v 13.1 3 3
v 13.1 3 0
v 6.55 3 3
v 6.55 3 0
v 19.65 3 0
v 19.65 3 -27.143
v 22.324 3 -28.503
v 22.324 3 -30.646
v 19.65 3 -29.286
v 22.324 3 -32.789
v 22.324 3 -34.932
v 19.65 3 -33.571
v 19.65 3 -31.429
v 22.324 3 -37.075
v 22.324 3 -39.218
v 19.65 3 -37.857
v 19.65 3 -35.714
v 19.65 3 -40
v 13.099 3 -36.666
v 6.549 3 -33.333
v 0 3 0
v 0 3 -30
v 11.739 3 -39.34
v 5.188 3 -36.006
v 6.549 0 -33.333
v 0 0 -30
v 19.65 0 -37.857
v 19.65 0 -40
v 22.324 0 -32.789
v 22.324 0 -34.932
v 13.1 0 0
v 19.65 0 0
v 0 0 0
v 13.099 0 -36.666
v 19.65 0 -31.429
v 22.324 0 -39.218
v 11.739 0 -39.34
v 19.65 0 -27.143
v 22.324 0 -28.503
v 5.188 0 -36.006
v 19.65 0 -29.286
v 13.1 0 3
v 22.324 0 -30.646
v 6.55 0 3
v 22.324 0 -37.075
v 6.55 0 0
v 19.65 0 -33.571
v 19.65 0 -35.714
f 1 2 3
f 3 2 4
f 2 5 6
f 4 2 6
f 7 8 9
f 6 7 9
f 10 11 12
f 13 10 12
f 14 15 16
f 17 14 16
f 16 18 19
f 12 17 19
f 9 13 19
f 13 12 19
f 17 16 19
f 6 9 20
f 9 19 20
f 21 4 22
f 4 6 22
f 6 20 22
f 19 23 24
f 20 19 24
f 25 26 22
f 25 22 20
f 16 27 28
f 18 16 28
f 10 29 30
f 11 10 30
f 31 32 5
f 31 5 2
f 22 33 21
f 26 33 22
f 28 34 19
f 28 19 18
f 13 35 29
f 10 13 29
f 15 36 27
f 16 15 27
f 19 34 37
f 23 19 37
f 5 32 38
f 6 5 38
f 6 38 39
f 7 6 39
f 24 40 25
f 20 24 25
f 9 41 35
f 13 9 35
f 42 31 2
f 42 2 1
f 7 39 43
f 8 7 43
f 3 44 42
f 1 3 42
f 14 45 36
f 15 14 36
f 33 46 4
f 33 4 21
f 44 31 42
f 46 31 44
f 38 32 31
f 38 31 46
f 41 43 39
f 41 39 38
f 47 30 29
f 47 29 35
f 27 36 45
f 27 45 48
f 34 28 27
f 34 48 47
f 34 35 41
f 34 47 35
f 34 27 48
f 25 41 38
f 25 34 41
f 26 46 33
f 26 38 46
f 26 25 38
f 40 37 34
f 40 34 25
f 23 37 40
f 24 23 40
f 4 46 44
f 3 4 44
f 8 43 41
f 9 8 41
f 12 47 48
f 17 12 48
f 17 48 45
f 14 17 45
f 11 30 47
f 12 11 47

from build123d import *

# Parameters (mm, degrees)
BOSS_EXTRUDE1_DEPTH = 3
SKETCH2_W           = 6.55
SKETCH2_H           = 3
BOSS_EXTRUDE2_DEPTH = 3


with BuildPart() as part:
    # Sketch1 → Boss-Extrude1 (new body)
    with BuildSketch(Plane(origin=(0, 0, 0), x_dir=(1, 0, 0), z_dir=(0, 1, 0))):
        Polygon((0, 30), (19.65, 40), (19.65, 30), (19.65, 0), (0, 0), align=None)
    extrude(amount=BOSS_EXTRUDE1_DEPTH)

    # Sketch2 → Boss-Extrude2 (add)
    with BuildSketch(Plane.XZ):
        Polygon((13.099461063, -36.666392399), (11.7388049, -39.340081761), (5.188265963, -36.006474159), (6.548922127, -33.332784797), align=None)
        Polygon((19.65, -27.142857143), (22.323732333, -28.503428866), (22.323732333, -30.646285866), (19.65, -29.285714143), align=None)
        Polygon((19.65, -31.428571143), (22.323732333, -32.789142866), (22.323732333, -34.931999866), (19.65, -33.571428143), align=None)
        Polygon((19.65, -35.714285143), (22.323732333, -37.074856866), (22.323732333, -39.217713866), (19.65, -37.857142143), align=None)
        with Locations((9.825, 1.5)):
            Rectangle(SKETCH2_W, SKETCH2_H)
    extrude(amount=-BOSS_EXTRUDE2_DEPTH)


solid = part.part
